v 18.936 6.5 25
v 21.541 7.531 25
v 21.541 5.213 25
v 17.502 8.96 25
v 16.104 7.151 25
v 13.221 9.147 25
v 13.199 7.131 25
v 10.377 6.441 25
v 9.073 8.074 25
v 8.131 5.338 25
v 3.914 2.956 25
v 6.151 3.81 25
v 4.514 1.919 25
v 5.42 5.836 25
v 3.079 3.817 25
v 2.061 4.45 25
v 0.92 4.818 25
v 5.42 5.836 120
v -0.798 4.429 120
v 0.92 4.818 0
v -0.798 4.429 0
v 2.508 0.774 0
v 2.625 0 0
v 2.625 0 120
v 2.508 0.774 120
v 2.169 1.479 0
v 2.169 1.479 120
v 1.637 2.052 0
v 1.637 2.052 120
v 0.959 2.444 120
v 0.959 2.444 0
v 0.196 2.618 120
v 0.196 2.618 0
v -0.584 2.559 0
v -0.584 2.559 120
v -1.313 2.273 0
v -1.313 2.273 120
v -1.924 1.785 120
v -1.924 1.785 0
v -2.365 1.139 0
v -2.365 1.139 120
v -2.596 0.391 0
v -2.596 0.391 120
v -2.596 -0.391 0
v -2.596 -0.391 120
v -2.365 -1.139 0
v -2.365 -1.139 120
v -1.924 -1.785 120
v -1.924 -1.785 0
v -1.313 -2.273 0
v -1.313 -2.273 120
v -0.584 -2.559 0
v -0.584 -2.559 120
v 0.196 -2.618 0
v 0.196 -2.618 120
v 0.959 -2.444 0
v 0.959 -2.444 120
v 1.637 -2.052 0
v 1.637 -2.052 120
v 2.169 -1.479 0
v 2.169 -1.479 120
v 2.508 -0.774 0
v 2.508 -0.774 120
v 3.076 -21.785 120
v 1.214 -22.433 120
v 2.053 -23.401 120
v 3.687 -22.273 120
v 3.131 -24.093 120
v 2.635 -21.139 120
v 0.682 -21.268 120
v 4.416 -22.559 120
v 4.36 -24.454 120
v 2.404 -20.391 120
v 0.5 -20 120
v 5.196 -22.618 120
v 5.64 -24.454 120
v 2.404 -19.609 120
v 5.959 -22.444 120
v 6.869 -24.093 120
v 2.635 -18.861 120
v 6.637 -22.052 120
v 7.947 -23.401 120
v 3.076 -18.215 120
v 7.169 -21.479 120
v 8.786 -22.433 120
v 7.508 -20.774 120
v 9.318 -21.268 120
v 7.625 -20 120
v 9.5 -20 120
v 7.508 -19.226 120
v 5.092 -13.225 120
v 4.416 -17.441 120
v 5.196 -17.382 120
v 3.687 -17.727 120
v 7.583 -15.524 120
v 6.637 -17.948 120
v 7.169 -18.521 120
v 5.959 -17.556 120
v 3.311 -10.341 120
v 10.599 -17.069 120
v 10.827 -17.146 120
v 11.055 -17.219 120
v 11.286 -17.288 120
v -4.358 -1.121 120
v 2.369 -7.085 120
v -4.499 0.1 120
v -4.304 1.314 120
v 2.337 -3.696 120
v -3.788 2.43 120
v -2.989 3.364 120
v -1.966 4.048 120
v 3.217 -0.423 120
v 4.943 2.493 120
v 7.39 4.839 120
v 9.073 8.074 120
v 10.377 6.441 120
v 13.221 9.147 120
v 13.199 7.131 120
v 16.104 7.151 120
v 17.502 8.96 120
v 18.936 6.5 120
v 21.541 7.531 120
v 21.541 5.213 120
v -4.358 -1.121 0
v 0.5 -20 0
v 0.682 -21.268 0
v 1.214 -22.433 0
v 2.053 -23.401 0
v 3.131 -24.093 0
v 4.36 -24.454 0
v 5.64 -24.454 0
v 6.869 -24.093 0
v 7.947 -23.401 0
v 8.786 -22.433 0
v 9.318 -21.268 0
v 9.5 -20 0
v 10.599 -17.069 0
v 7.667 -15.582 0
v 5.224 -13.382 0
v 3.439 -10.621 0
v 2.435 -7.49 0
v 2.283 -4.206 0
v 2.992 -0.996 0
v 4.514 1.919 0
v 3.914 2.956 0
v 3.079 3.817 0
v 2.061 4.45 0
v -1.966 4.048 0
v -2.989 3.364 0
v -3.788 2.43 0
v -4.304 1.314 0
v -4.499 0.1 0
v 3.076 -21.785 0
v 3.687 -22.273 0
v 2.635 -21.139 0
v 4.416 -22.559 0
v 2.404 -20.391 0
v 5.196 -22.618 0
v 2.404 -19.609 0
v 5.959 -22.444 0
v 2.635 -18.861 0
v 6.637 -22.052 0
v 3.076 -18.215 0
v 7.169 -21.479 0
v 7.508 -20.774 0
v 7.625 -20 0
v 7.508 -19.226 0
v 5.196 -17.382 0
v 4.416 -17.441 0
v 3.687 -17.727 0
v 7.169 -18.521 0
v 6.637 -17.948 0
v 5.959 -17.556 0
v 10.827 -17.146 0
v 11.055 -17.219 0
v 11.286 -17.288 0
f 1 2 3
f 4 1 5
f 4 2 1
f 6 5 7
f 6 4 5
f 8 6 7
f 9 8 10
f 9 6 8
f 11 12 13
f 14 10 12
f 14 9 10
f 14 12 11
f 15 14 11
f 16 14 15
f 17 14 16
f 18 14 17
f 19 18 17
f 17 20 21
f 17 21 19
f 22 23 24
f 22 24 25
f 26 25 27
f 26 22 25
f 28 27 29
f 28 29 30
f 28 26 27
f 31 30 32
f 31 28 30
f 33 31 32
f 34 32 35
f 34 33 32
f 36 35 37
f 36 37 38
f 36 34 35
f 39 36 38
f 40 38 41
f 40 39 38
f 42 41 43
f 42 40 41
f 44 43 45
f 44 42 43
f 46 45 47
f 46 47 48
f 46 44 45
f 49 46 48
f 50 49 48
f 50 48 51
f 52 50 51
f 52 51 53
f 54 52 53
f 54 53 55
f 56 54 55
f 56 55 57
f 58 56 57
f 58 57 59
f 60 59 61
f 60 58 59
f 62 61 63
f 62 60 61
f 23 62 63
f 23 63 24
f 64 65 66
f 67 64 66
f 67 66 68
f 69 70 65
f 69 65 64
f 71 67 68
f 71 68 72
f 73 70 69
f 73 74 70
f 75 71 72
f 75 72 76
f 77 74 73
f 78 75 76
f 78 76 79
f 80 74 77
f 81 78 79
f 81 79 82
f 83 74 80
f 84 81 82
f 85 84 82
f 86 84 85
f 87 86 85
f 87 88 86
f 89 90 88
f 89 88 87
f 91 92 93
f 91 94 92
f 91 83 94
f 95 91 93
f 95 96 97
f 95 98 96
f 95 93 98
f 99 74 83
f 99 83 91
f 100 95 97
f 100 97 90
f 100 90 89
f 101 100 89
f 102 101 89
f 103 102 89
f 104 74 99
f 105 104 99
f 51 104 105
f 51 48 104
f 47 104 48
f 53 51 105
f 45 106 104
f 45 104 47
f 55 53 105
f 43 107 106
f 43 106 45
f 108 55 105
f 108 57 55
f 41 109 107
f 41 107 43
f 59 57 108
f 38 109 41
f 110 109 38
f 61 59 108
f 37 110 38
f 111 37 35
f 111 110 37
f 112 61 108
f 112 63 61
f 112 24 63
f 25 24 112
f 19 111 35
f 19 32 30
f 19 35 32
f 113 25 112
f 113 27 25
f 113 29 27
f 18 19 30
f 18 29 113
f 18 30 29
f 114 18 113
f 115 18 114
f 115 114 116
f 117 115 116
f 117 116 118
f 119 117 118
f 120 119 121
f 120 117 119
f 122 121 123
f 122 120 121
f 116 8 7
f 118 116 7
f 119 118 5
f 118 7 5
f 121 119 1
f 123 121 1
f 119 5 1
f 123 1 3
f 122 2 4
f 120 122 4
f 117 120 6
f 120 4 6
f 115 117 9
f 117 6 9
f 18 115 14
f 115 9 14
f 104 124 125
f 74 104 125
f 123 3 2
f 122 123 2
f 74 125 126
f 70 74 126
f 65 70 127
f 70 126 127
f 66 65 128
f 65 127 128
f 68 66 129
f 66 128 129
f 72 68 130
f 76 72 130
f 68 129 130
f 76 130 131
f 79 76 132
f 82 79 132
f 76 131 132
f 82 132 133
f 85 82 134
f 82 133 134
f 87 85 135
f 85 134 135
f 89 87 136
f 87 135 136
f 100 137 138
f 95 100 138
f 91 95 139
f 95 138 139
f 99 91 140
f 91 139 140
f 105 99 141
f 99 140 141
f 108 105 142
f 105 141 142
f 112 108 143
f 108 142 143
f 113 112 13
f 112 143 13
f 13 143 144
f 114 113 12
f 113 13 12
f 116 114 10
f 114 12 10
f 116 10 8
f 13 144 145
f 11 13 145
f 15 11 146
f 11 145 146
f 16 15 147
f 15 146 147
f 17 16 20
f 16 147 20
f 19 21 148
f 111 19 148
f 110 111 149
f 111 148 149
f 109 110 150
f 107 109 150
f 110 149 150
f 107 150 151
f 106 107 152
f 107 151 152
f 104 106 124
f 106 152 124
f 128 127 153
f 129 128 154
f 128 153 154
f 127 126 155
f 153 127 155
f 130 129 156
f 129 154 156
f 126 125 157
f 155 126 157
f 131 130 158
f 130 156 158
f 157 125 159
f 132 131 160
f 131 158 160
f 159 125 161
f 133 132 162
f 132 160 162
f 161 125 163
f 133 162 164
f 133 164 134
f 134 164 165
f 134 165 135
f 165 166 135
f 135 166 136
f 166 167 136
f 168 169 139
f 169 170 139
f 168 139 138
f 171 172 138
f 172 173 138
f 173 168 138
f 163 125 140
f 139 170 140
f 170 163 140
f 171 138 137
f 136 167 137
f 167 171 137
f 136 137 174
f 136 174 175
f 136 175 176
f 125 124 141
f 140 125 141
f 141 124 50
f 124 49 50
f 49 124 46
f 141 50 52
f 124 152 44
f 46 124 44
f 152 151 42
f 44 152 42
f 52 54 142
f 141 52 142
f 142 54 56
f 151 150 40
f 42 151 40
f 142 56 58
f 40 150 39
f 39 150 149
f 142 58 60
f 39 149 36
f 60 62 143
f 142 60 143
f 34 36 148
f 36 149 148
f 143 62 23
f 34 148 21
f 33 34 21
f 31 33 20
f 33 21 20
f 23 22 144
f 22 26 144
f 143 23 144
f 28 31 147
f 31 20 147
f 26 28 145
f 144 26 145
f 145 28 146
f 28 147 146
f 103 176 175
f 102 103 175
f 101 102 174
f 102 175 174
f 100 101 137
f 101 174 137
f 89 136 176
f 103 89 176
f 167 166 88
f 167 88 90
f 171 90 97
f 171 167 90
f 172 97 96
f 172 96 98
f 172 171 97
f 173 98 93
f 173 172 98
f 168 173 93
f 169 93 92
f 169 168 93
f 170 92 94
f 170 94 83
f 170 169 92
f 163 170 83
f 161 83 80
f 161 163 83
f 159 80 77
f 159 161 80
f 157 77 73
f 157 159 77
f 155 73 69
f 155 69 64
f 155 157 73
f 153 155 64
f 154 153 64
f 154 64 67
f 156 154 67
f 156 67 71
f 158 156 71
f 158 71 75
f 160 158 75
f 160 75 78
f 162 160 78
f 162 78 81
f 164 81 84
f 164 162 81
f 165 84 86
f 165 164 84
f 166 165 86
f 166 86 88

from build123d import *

# Parameters (mm, degrees)
ESQUISSE1_R             = 2.625
BOSS_EXTRU_1_DEPTH      = 120
ENL_V_MAT_EXTRU_1_DEPTH = 25


with BuildPart() as part:
    # Esquisse1 → Boss.-Extru.1 (new body)
    with BuildSketch(Plane.XY):
        with BuildLine():
            ThreePointArc((-0.79755539, 4.428758901), (-3.787637609, 2.429773929), (-4.358021192, -1.12145053))
            Line((-4.358021192, -1.12145053), (0.5, -20))
            ThreePointArc((0.5, -20), (5, -24.5), (9.5, -20))
            Line((9.5, -20), (11.28572177, -17.287605871))
            ThreePointArc((11.28572177, -17.287605871), (10.940890985, -17.183131081), (10.599214607, -17.068761049))
            ThreePointArc((10.599214607, -17.068761049), (2.237966256, -5.391928791), (10.376689651, 6.441078731))
            ThreePointArc((10.376689651, 6.441078731), (16.104400227, 7.151408987), (21.540678755, 5.212823607))
            Line((21.540678755, 5.212823607), (21.540678755, 7.531281515))
            ThreePointArc((21.540678755, 7.531281515), (13.221135766, 9.146884287), (5.419576542, 5.836198326))
            Line((5.419576542, 5.836198326), (-0.79755539, 4.428758901))
        make_face()
        with Locations((5, -20)):
            Circle(ESQUISSE1_R, mode=Mode.SUBTRACT)
        Circle(ESQUISSE1_R, mode=Mode.SUBTRACT)
    extrude(amount=BOSS_EXTRU_1_DEPTH)

    # Esquisse2 → Enlèv. mat.-Extru.1 (cut)
    with BuildSketch(Plane(origin=(0, 0, 0), x_dir=(-1, 0, 0), z_dir=(0, 0, -1))):
        with BuildLine():
            Line((-0.802648586, 4.838533405), (-23.542155856, 15.333417872))
            Line((-23.542155856, 15.333417872), (-23.542155856, 4.140650018))
            Line((-23.542155856, 4.140650018), (-4.513818825, 1.918616657))
            ThreePointArc((-4.513818825, 1.918616657), (-3.032768518, 3.854603141), (-0.802648586, 4.838533405))
        make_face()
    extrude(amount=-ENL_V_MAT_EXTRU_1_DEPTH, mode=Mode.SUBTRACT)


solid = part.part
